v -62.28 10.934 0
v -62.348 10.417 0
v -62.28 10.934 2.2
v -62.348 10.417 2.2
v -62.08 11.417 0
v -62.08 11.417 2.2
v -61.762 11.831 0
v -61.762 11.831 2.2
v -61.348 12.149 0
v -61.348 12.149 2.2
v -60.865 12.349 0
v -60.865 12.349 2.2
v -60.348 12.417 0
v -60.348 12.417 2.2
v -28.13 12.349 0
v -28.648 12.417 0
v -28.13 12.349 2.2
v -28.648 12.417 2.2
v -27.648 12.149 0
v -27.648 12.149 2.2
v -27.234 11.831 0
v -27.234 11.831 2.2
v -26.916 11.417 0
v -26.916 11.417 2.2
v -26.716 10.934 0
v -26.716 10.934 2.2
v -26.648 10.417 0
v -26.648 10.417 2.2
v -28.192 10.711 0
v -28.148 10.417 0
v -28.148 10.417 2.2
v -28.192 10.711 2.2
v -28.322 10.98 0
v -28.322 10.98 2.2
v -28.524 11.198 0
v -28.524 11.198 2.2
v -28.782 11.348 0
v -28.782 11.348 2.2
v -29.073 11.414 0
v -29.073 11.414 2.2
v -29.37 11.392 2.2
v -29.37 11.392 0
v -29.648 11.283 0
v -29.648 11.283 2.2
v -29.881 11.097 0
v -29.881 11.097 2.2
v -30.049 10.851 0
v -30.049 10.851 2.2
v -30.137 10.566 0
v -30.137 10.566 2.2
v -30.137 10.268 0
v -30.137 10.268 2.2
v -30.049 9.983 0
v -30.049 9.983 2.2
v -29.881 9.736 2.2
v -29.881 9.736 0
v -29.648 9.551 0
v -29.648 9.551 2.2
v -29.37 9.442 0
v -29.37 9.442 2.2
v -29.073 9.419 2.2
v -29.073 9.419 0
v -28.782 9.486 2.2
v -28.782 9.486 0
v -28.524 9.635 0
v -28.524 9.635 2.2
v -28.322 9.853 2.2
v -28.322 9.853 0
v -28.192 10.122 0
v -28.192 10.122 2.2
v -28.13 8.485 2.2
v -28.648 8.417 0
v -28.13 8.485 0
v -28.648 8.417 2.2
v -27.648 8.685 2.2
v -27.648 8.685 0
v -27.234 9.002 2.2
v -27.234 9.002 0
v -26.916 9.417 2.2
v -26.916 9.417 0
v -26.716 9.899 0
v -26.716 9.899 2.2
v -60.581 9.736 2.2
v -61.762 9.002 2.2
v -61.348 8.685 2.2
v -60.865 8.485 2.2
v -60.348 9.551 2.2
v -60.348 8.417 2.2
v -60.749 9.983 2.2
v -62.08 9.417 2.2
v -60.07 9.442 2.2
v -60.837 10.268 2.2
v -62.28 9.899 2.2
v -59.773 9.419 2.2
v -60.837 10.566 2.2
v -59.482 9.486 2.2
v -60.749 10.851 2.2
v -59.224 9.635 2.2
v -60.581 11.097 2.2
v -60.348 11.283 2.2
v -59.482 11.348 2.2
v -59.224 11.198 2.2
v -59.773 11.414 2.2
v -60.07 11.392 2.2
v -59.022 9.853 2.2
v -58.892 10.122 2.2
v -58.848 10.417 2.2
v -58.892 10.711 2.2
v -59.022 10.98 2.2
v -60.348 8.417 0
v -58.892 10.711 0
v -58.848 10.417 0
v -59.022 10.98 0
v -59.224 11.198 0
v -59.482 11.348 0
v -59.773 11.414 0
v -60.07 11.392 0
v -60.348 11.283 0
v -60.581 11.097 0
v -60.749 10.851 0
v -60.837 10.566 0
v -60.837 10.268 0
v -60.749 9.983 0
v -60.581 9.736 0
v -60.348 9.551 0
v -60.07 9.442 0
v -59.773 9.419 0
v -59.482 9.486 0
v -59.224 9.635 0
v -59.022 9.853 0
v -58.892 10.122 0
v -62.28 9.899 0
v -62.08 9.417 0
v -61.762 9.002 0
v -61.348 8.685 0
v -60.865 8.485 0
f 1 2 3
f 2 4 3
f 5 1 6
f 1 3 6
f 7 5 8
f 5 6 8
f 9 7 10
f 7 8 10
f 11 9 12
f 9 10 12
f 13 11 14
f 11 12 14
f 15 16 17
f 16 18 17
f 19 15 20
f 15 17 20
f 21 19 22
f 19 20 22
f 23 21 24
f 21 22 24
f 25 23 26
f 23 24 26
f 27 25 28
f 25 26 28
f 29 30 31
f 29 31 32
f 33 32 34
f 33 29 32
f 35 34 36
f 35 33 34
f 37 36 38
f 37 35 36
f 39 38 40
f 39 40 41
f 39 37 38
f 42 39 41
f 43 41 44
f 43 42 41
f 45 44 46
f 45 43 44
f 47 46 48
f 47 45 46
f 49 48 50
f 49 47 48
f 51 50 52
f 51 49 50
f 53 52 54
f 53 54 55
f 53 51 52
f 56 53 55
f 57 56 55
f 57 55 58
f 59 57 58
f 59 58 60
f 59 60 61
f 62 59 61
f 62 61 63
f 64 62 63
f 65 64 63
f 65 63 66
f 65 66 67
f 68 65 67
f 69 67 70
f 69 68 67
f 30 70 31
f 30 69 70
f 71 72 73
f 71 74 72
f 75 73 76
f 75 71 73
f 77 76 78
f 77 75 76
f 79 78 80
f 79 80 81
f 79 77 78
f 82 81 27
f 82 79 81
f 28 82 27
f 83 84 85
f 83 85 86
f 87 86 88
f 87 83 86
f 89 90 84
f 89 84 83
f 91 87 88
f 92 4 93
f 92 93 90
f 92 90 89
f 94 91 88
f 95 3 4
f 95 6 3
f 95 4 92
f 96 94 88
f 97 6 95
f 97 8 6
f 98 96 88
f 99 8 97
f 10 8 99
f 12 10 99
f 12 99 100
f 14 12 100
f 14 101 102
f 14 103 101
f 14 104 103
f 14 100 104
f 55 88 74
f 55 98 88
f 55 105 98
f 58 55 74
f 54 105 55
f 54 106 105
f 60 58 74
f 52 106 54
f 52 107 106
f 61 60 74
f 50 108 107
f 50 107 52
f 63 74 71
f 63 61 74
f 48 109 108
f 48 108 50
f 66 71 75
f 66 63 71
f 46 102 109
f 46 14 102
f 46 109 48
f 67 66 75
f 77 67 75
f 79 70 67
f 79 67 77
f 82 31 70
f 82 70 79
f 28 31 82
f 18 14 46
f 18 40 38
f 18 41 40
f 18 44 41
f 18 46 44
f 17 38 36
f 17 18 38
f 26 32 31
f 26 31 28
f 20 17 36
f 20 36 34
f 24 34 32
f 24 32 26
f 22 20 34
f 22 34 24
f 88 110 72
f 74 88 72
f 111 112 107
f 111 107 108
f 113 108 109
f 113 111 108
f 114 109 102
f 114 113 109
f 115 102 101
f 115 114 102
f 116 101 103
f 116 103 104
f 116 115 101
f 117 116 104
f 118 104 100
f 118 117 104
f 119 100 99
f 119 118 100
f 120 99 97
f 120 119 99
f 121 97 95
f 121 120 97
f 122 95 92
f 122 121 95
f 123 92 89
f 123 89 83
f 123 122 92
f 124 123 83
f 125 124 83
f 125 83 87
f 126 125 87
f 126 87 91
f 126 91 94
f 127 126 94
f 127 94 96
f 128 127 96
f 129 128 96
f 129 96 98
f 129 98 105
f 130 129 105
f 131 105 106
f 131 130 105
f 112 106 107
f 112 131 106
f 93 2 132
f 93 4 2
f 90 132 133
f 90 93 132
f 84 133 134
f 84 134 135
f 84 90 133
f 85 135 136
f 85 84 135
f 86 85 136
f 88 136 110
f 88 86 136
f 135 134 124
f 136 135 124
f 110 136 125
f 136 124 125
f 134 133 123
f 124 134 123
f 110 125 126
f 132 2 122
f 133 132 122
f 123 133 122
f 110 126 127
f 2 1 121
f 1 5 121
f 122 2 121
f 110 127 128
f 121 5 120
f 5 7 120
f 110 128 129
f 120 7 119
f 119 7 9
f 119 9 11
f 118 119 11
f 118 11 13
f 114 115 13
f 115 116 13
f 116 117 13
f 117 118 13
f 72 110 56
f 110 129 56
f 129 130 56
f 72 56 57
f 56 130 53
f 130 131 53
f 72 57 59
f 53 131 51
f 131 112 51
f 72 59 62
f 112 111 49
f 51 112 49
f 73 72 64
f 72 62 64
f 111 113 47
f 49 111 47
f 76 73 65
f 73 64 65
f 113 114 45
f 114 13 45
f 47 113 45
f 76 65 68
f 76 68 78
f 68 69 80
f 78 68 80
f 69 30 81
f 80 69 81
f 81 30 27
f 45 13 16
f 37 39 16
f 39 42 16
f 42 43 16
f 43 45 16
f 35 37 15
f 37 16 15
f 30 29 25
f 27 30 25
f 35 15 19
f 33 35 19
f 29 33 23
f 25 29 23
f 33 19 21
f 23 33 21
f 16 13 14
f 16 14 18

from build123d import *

# Parameters (mm, degrees)
CROQUIS1_W              = 35.7
CROQUIS1_H              = 4
CROQUIS1_R              = 1
SALIENTE_EXTRUIR1_DEPTH = 2.2
REDONDEO1_R             = 2


with BuildPart() as part:
    # Croquis1 → Saliente-Extruir1 (new body)
    with BuildSketch(Plane.XY):
        with Locations((-44.497764467, 10.416666667)):
            Rectangle(CROQUIS1_W, CROQUIS1_H)
        with Locations((-59.847764467, 10.416666667)):
            Circle(CROQUIS1_R, mode=Mode.SUBTRACT)
        with Locations((-29.147764467, 10.416666667)):
            Circle(CROQUIS1_R, mode=Mode.SUBTRACT)
    extrude(amount=SALIENTE_EXTRUIR1_DEPTH)

    # Redondeo1
    redondeo1_edges = [part.edges().sort_by_distance(p)[0] for p in [
        (-62.347764467, 8.416666667, 1.1),
        (-62.347764467, 12.416666667, 1.1),
        (-26.647764467, 8.416666667, 1.1),
        (-26.647764467, 12.416666667, 1.1),
    ]]
    fillet(redondeo1_edges, radius=REDONDEO1_R - 0.0001)  # a hair under: the kernel refuses the full size


solid = part.part
